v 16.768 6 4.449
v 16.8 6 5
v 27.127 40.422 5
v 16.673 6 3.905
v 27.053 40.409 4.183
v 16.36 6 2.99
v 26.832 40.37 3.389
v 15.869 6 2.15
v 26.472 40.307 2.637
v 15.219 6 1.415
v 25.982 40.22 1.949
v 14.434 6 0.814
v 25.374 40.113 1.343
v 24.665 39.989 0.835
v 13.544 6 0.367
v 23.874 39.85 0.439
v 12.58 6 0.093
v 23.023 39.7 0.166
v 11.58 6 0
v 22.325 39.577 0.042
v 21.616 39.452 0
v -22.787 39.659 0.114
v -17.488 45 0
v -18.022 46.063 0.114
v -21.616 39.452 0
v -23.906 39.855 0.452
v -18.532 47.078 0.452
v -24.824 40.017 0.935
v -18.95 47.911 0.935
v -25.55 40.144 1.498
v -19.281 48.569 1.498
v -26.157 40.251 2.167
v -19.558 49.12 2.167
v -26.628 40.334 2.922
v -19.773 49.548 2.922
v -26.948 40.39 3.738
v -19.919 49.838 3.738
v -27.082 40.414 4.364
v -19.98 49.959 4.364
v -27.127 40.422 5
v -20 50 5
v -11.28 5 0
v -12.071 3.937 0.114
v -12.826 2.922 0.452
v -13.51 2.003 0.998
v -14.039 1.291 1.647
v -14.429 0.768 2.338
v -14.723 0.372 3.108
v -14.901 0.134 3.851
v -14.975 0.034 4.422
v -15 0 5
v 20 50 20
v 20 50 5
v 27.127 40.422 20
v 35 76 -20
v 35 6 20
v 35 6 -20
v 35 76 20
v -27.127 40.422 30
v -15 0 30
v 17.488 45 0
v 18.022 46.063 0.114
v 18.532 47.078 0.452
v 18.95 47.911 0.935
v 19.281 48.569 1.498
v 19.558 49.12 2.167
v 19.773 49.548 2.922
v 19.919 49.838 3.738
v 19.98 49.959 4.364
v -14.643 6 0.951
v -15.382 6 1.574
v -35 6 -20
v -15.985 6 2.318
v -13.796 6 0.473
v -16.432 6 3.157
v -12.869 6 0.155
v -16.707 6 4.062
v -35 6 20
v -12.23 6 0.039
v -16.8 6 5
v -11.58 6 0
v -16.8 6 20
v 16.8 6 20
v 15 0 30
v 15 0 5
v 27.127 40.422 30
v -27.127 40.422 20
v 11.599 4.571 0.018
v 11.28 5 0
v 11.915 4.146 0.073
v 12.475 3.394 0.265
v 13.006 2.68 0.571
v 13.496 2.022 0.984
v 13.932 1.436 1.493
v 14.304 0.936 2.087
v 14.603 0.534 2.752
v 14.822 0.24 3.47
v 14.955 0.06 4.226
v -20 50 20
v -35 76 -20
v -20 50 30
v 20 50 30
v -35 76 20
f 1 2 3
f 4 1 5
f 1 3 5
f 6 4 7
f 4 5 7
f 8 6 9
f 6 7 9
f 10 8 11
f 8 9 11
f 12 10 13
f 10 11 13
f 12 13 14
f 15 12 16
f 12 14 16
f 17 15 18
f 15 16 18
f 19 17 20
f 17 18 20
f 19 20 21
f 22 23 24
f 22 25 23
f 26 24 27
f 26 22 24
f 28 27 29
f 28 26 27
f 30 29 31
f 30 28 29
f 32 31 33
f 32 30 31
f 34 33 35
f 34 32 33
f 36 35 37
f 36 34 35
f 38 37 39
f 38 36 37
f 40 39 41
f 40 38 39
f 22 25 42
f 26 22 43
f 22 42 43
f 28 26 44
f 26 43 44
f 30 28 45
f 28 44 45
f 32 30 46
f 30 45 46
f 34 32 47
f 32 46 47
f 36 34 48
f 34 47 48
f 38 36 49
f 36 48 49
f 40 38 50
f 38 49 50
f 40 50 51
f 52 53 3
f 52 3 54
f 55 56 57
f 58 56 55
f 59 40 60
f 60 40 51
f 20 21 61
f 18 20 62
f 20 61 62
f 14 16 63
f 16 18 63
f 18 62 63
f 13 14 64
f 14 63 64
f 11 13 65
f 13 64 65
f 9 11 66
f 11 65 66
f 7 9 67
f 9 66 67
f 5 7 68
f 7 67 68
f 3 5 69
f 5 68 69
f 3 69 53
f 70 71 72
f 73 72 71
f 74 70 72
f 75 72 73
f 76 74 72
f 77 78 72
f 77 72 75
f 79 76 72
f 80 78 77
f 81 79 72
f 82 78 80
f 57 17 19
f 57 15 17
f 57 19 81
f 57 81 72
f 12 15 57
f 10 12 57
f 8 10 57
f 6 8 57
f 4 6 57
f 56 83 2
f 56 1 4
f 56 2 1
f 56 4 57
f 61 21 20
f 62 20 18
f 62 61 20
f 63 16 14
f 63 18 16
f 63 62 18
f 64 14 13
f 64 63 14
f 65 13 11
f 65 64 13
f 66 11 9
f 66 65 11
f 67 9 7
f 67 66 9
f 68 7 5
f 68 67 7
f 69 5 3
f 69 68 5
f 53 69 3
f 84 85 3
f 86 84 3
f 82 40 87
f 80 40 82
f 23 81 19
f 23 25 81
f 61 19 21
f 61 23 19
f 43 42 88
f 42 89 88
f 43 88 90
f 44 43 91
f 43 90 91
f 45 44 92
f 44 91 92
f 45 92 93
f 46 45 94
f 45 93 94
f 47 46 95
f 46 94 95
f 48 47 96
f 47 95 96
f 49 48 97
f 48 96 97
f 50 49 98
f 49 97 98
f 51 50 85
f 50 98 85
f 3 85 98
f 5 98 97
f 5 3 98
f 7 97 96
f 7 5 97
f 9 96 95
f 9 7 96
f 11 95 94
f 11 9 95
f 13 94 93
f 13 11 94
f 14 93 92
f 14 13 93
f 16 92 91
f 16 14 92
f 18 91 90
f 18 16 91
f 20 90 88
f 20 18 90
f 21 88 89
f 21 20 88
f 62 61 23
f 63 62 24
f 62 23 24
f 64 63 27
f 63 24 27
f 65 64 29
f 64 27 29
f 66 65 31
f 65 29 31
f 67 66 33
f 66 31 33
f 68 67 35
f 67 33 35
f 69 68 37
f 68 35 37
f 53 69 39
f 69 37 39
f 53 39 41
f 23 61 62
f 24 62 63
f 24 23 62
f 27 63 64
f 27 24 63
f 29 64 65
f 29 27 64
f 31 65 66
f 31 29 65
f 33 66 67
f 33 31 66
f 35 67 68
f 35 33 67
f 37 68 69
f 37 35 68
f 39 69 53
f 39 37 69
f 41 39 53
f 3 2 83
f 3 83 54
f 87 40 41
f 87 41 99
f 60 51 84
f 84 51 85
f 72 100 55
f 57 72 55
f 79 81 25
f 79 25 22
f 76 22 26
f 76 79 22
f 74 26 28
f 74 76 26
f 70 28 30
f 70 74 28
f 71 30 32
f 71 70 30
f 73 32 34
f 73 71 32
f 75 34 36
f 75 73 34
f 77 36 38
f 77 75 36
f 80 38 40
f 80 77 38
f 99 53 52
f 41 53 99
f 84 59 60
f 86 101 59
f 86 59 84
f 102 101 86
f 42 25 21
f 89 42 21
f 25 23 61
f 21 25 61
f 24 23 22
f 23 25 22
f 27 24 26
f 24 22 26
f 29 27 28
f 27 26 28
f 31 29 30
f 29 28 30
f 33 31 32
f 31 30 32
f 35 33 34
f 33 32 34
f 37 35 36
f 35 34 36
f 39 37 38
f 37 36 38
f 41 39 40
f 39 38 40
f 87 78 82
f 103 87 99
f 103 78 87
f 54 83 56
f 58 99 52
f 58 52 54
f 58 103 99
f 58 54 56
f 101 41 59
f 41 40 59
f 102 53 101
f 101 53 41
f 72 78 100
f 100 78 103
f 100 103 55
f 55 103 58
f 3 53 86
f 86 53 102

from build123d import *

# Parameters (mm, degrees)
F1_DEPTH      = 30
F2_SIZE       = 10
F3_R          = 5
F4_W          = 70
F4_H          = 70
F5_DEPTH      = 20
F5_DEPTH_BACK = 20


with BuildPart() as f1:
    # F0 (on Top) → F1 (new body)
    with BuildSketch(Plane.XY):
        Polygon((-15, 0), (0, 0), (15, 0), (30, 50), (0, 50), (-30, 50), align=None)
    extrude(amount=F1_DEPTH)

    # F2
    f2_edges = [f1.edges().sort_by_distance(p)[0] for p in [
        (-30, 50, 15),
        (30, 50, 15),
    ]]
    chamfer(f2_edges, length=F2_SIZE)

    # F3
    f3_edges = [f1.edges().sort_by_distance(p)[0] for p in [
        (21.063261, 20.210869, 0),
        (23.563261, 45.210869, 0),
        (0, 0, 0),
        (0, 50, 0),
        (-21.063261, 20.210869, 0),
        (-23.563261, 45.210869, 0),
    ]]
    fillet(f3_edges, radius=F3_R)


with BuildPart() as f5:
    # F4 (on Top) → F5 (new body, two sides)
    with BuildSketch(Plane.XY) as f5_sk:
        with Locations((0, 41)):
            Rectangle(F4_W, F4_H)
    extrude(amount=F5_DEPTH)
    extrude(f5_sk.sketch, amount=-F5_DEPTH_BACK)

    # F6: cut F1
    add(f1.part, mode=Mode.SUBTRACT)


solid = Compound([f1.part, f5.part])
